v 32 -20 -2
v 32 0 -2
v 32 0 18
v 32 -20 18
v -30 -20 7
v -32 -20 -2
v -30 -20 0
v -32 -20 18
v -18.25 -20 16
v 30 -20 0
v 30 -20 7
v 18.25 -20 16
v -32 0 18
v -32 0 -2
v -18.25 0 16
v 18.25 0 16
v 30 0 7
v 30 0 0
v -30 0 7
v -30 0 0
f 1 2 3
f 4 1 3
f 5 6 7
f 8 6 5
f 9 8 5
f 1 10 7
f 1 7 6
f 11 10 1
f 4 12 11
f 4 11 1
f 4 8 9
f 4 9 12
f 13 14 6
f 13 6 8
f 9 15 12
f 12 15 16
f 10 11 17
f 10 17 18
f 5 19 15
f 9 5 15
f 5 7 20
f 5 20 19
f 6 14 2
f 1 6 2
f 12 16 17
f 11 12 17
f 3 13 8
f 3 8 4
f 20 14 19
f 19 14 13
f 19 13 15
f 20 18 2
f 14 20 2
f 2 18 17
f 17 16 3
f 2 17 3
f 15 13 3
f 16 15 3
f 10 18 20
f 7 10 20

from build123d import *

# Parameters (mm, degrees)
SKETCH_W  = 64
SKETCH_H  = 20
PAD_DEPTH = 20


with BuildPart() as part:
    # Sketch → Pad (new body)
    with BuildSketch(Plane.XZ):
        with Locations((0, 8)):
            Rectangle(SKETCH_W, SKETCH_H)
        Polygon((-18.25, 16), (18.25, 16), (30, 7), (30, 0), (-30, 0), (-30, 7), align=None, mode=Mode.SUBTRACT)
    extrude(amount=PAD_DEPTH)


solid = part.part
